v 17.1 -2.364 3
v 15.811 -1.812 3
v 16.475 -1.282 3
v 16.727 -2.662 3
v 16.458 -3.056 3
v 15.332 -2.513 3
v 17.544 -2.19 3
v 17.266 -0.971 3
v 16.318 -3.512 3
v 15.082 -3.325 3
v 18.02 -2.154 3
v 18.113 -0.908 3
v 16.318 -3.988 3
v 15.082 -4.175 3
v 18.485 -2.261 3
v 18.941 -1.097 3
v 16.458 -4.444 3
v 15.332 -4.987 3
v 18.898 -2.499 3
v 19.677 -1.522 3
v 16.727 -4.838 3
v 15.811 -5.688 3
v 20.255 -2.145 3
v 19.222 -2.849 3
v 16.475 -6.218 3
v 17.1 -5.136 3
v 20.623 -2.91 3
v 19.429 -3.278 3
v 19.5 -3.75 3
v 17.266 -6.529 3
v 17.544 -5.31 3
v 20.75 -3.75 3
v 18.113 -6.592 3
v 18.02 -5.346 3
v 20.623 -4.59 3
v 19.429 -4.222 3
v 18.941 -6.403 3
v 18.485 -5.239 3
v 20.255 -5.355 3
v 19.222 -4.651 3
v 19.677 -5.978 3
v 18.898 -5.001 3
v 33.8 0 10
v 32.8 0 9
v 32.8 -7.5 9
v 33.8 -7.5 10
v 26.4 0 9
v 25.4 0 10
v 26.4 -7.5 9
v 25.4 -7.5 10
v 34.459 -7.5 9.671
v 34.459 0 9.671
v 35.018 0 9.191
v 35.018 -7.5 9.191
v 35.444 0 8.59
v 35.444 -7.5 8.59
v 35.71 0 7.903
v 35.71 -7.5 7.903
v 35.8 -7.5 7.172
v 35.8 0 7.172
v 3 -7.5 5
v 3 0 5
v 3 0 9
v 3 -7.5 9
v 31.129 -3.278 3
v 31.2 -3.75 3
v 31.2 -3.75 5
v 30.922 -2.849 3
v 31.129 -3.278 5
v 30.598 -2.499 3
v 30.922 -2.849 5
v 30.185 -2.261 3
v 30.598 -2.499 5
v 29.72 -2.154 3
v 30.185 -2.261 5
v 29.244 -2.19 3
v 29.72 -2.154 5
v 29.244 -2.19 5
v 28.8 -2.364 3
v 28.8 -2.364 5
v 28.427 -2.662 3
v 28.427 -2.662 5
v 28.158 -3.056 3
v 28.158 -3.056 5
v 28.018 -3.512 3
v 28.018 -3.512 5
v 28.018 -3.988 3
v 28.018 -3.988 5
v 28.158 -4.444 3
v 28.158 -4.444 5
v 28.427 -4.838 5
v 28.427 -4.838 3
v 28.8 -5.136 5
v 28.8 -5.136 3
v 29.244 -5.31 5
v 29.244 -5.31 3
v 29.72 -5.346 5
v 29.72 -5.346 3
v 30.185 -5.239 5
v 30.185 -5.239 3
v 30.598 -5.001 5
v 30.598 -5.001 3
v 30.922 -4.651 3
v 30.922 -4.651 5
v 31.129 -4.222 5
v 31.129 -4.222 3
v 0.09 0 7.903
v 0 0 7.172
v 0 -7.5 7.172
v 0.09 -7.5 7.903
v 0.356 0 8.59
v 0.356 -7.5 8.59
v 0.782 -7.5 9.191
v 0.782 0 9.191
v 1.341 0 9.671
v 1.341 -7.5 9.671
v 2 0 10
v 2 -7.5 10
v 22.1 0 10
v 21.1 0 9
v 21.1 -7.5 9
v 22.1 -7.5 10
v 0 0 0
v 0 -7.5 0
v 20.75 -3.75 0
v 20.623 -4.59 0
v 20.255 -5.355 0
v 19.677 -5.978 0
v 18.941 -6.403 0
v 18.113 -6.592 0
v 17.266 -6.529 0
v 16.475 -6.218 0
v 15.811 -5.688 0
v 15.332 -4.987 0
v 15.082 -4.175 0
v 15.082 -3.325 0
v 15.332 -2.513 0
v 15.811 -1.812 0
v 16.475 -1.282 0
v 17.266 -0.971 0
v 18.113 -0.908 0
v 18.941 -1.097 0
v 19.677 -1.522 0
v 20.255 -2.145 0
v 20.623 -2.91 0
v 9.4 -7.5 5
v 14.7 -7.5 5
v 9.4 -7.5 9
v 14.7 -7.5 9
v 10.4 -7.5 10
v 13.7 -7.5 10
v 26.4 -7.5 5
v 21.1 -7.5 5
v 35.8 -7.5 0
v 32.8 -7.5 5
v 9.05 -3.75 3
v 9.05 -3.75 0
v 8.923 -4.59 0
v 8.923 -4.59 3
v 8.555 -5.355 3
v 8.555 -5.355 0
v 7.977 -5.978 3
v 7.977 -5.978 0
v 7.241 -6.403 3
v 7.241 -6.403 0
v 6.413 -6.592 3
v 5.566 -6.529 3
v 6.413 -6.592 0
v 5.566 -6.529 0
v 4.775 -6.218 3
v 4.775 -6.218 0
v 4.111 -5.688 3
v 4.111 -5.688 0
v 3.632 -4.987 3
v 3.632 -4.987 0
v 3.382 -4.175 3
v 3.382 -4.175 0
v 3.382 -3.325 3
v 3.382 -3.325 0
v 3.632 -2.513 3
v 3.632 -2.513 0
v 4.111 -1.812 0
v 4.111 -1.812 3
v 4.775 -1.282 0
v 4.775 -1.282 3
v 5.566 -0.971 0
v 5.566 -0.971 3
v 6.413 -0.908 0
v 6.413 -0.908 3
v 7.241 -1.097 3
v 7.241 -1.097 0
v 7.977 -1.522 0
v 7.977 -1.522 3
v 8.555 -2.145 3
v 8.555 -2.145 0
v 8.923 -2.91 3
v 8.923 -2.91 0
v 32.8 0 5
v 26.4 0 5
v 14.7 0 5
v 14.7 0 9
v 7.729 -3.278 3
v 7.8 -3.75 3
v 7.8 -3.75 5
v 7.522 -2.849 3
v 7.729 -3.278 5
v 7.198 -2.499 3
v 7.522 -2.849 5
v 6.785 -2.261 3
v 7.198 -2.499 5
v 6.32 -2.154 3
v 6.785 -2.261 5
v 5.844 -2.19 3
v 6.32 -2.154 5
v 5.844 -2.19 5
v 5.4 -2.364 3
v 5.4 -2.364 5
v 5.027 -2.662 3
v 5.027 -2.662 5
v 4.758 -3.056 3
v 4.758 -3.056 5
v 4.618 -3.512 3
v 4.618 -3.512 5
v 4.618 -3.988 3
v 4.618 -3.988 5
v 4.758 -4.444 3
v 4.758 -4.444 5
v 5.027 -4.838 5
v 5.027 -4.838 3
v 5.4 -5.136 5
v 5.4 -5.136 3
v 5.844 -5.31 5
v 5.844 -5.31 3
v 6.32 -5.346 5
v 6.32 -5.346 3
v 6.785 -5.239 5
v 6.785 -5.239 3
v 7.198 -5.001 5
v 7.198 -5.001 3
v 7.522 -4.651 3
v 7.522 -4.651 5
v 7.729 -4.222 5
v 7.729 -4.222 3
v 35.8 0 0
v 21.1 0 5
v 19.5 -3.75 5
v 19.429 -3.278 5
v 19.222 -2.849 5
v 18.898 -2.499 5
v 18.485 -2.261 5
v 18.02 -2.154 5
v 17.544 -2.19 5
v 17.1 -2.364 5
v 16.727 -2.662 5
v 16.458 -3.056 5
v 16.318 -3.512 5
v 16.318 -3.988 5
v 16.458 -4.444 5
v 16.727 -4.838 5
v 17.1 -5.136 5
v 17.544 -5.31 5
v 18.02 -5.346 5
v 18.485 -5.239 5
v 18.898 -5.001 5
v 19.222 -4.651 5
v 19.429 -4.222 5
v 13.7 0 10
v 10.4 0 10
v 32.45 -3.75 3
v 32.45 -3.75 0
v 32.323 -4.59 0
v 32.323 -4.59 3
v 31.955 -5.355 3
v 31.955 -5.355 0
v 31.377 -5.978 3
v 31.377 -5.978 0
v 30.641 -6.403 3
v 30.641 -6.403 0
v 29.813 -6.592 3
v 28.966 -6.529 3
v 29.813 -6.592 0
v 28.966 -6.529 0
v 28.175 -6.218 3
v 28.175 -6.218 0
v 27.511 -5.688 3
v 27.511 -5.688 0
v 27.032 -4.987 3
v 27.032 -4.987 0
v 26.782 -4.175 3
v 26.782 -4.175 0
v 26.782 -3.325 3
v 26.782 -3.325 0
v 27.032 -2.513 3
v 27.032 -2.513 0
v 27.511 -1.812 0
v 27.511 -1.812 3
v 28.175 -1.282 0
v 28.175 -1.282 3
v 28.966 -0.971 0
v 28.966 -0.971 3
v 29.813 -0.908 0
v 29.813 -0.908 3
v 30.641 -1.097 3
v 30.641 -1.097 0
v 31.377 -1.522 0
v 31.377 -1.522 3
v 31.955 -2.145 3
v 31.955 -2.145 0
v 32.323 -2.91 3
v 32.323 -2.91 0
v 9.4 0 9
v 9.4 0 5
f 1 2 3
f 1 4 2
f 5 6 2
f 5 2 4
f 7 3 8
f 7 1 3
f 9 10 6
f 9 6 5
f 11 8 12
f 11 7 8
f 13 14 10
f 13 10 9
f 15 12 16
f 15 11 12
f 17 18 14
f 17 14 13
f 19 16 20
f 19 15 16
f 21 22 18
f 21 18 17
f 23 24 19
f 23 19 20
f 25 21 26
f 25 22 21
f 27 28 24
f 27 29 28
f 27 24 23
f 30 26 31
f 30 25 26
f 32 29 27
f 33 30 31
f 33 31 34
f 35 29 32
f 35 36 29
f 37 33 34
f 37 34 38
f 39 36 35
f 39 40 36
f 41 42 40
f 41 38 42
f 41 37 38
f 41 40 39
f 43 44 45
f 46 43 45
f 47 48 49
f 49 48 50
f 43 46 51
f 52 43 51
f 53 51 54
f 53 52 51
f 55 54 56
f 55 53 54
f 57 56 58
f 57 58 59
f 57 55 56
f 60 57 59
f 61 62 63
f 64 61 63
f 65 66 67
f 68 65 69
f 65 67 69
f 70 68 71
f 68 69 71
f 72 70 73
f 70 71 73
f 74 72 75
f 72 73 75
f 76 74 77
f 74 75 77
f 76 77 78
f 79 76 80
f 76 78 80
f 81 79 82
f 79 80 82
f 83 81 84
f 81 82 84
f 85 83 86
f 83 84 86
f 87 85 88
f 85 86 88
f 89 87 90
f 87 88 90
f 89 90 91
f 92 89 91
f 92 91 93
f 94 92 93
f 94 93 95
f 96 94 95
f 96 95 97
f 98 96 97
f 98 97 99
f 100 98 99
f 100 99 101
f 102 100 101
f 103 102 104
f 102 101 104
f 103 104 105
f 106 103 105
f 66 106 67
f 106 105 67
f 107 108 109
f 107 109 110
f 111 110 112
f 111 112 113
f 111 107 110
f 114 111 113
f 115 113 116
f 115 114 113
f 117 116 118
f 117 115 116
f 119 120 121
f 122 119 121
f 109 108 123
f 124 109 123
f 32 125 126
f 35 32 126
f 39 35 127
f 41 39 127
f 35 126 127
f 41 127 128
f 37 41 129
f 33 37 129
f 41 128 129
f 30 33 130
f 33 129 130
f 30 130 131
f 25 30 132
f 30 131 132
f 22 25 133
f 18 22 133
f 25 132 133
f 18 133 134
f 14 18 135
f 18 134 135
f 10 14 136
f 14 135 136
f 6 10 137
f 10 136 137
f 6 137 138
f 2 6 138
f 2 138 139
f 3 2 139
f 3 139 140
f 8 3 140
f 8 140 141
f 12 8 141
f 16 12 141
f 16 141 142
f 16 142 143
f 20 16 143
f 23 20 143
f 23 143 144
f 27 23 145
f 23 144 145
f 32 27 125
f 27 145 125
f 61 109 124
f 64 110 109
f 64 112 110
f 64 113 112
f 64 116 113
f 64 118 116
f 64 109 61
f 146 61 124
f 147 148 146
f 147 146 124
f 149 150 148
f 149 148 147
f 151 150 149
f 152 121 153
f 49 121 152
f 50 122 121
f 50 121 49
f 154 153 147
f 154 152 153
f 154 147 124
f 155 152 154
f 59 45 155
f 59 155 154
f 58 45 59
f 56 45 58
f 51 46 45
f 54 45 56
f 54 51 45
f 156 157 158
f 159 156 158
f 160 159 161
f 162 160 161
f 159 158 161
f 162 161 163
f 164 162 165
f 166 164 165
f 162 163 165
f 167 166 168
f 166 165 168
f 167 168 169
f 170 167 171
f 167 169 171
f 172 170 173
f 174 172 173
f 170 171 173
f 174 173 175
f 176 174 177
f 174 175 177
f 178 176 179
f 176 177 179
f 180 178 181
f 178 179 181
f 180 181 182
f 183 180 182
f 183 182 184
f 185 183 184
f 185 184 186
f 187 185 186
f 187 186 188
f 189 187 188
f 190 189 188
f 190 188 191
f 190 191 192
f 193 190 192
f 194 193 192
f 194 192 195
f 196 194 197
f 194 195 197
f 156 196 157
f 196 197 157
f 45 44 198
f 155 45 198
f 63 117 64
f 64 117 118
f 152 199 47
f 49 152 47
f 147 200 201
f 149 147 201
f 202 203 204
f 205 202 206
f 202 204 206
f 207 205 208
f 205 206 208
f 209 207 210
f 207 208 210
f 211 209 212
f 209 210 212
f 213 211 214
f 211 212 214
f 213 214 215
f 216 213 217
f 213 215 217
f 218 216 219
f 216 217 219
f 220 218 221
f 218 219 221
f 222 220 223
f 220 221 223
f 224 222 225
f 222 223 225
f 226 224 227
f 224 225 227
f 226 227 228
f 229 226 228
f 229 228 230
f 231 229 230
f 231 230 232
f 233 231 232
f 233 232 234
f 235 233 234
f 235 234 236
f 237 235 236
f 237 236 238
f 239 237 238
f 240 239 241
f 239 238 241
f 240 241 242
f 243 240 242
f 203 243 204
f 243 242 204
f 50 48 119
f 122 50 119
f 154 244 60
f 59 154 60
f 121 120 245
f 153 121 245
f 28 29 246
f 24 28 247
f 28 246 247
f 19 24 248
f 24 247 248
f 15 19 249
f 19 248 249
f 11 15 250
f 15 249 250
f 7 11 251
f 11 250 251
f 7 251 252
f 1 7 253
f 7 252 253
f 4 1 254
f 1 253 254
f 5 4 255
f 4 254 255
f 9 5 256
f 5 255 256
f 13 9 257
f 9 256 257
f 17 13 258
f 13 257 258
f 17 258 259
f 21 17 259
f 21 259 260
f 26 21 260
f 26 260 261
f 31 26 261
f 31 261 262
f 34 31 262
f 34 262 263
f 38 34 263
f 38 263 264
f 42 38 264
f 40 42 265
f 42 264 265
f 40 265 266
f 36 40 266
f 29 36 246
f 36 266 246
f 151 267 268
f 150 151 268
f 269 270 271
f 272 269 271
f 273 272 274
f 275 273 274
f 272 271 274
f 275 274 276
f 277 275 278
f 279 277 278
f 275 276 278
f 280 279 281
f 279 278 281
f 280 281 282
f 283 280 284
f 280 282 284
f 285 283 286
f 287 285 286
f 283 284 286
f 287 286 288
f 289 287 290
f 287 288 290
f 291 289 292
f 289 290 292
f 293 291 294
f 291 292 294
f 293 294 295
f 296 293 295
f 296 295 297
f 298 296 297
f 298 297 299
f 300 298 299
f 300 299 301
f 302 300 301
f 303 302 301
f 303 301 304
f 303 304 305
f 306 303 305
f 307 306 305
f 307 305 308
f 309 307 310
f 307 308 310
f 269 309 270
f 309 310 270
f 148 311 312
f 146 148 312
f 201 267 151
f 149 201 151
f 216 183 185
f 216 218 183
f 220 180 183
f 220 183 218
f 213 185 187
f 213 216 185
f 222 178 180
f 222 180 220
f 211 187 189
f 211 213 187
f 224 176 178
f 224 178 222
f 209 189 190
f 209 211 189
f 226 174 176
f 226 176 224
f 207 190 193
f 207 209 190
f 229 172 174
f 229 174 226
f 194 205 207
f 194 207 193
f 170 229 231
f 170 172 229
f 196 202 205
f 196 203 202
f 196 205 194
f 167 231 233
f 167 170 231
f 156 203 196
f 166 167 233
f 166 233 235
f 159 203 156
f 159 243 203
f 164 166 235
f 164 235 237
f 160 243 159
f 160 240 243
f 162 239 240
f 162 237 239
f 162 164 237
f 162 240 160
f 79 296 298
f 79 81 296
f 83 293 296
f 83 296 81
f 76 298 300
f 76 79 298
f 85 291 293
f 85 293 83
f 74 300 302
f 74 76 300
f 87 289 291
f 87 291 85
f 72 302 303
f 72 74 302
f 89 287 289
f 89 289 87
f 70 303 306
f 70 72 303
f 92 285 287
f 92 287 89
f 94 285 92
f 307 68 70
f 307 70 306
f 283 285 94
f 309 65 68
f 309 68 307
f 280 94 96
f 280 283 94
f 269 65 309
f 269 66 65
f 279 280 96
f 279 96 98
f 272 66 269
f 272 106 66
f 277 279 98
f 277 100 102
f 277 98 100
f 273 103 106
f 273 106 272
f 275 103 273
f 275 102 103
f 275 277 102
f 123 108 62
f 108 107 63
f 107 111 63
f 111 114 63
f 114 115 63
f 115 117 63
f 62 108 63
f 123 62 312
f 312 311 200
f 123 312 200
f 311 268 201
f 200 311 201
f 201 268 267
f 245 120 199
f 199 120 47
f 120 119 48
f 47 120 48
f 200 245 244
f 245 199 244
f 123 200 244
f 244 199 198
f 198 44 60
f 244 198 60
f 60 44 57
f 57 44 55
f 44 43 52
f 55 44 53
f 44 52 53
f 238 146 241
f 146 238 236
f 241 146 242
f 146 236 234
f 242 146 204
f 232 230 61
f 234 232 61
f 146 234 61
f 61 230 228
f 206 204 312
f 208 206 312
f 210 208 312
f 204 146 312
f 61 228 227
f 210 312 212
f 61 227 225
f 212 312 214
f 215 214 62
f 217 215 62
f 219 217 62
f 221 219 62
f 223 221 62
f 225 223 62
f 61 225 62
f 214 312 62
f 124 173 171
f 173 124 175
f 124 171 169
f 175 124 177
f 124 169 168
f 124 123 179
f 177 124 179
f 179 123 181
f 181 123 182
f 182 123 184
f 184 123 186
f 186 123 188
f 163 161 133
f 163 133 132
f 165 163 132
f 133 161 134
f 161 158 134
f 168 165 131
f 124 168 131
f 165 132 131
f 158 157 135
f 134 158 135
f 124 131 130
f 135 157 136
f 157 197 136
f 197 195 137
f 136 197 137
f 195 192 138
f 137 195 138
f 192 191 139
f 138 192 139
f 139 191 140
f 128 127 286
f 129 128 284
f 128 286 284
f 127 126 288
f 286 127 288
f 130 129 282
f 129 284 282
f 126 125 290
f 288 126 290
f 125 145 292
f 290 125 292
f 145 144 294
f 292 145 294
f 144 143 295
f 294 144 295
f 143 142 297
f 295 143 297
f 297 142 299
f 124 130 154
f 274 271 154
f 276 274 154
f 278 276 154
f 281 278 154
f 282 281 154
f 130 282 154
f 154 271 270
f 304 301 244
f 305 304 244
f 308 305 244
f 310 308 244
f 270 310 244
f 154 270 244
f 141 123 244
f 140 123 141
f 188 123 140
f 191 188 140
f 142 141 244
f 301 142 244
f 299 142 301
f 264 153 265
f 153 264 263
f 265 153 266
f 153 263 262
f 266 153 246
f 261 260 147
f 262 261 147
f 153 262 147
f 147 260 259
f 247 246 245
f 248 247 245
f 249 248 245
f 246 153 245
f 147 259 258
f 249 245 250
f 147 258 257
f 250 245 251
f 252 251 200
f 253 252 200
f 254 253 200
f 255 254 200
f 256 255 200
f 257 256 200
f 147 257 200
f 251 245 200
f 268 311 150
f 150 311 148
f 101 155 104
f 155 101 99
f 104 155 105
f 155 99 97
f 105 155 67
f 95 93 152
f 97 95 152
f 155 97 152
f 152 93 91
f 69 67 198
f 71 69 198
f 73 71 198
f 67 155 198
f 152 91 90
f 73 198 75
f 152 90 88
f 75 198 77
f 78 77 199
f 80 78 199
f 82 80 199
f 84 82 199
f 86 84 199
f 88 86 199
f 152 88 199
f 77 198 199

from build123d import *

# Parameters (mm, degrees)
F1_DEPTH    = 7.5
F2_SIZE     = 1
F3_T1_DEPTH = 21.6421356237
F4_R        = 1.6
F5_DEPTH    = 5.001
F6_R        = 1.6
F7_DEPTH    = 5.001
F8_R        = 1.6
F9_DEPTH    = 5.001
F10_R       = 2.85
F10_R_2     = 1.6
F11_DEPTH   = 3


# Not quite as in the source:
# - a fillet or chamfer that OpenCascade refuses, or shapes differently, is made with other operations: its cross-section is extruded or revolved along the edge and cut away or added


with BuildPart() as f1:
    # F0 (on Front) → F1 (new body)
    with BuildSketch(Plane.XZ):
        Polygon((0, 10), (0, 0), (35.8, 0), (35.8, 10), (32.8, 10), (32.8, 5), (26.4, 5), (26.4, 10), (21.1, 10), (21.1, 5), (14.7, 5), (14.7, 10), (9.4, 10), (9.4, 5), (3, 5), (3, 10), align=None)
    extrude(amount=F1_DEPTH)

    # F2
    f2_edges = [f1.edges().sort_by_distance(p)[0] for p in [
        (3, -3.75, 10),
        (9.4, -3.75, 10),
        (14.7, -3.75, 10),
        (21.1, -3.75, 10),
        (26.4, -3.75, 10),
        (32.8, -3.75, 10),
    ]]
    chamfer(f2_edges, length=F2_SIZE)

    # F3: fillet of radius 3 on 2 edges, made by hand

    # F3_s2 → F3_t1 (cut)
    with BuildSketch(Plane.XZ.offset(-7.0710678119)):
        with BuildLine():
            ThreePointArc((0, 7.1715728753), (0.5505102572, 8.9036236828), (2, 10))
            Line((2, 10), (0, 10))
            Line((0, 10), (0, 7.1715728753))
        make_face()
        with BuildLine():
            ThreePointArc((33.8, 10), (35.2494897428, 8.9036236828), (35.8, 7.1715728753))
            Line((35.8, 7.1715728753), (35.8, 10))
            Line((35.8, 10), (33.8, 10))
        make_face()
    extrude(amount=F3_T1_DEPTH, mode=Mode.SUBTRACT)

    # F4 (on face) → F5 (cut, through all)
    with BuildSketch(Plane.XY.offset(5)):
        with Locations((6.2, -3.75)):
            Circle(F4_R)
    extrude(amount=-F5_DEPTH, mode=Mode.SUBTRACT)

    # F6 (on face) → F7 (cut, through all)
    with BuildSketch(Plane.XY.offset(5)):
        with Locations((17.9, -3.75)):
            Circle(F6_R)
    extrude(amount=-F7_DEPTH, mode=Mode.SUBTRACT)

    # F8 (on face) → F9 (cut, through all)
    with BuildSketch(Plane.XY.offset(5)):
        with Locations((29.6, -3.75)):
            Circle(F8_R)
    extrude(amount=-F9_DEPTH, mode=Mode.SUBTRACT)

    # F10 (on face) → F11 (cut)
    with BuildSketch(Plane(origin=(0, 0, 0), x_dir=(1, 0, 0), z_dir=(0, 0, -1))):
        with Locations((6.2, 3.75)):
            Circle(F10_R)
        with Locations((6.2, 3.75)):
            Circle(F10_R_2, mode=Mode.SUBTRACT)
        with Locations((17.9, 3.75)):
            Circle(F10_R)
        with Locations((17.9, 3.75)):
            Circle(F10_R_2, mode=Mode.SUBTRACT)
        with Locations((29.6, 3.75)):
            Circle(F10_R)
        with Locations((29.6, 3.75)):
            Circle(F10_R_2, mode=Mode.SUBTRACT)
    extrude(amount=-F11_DEPTH, mode=Mode.SUBTRACT)


solid = f1.part
